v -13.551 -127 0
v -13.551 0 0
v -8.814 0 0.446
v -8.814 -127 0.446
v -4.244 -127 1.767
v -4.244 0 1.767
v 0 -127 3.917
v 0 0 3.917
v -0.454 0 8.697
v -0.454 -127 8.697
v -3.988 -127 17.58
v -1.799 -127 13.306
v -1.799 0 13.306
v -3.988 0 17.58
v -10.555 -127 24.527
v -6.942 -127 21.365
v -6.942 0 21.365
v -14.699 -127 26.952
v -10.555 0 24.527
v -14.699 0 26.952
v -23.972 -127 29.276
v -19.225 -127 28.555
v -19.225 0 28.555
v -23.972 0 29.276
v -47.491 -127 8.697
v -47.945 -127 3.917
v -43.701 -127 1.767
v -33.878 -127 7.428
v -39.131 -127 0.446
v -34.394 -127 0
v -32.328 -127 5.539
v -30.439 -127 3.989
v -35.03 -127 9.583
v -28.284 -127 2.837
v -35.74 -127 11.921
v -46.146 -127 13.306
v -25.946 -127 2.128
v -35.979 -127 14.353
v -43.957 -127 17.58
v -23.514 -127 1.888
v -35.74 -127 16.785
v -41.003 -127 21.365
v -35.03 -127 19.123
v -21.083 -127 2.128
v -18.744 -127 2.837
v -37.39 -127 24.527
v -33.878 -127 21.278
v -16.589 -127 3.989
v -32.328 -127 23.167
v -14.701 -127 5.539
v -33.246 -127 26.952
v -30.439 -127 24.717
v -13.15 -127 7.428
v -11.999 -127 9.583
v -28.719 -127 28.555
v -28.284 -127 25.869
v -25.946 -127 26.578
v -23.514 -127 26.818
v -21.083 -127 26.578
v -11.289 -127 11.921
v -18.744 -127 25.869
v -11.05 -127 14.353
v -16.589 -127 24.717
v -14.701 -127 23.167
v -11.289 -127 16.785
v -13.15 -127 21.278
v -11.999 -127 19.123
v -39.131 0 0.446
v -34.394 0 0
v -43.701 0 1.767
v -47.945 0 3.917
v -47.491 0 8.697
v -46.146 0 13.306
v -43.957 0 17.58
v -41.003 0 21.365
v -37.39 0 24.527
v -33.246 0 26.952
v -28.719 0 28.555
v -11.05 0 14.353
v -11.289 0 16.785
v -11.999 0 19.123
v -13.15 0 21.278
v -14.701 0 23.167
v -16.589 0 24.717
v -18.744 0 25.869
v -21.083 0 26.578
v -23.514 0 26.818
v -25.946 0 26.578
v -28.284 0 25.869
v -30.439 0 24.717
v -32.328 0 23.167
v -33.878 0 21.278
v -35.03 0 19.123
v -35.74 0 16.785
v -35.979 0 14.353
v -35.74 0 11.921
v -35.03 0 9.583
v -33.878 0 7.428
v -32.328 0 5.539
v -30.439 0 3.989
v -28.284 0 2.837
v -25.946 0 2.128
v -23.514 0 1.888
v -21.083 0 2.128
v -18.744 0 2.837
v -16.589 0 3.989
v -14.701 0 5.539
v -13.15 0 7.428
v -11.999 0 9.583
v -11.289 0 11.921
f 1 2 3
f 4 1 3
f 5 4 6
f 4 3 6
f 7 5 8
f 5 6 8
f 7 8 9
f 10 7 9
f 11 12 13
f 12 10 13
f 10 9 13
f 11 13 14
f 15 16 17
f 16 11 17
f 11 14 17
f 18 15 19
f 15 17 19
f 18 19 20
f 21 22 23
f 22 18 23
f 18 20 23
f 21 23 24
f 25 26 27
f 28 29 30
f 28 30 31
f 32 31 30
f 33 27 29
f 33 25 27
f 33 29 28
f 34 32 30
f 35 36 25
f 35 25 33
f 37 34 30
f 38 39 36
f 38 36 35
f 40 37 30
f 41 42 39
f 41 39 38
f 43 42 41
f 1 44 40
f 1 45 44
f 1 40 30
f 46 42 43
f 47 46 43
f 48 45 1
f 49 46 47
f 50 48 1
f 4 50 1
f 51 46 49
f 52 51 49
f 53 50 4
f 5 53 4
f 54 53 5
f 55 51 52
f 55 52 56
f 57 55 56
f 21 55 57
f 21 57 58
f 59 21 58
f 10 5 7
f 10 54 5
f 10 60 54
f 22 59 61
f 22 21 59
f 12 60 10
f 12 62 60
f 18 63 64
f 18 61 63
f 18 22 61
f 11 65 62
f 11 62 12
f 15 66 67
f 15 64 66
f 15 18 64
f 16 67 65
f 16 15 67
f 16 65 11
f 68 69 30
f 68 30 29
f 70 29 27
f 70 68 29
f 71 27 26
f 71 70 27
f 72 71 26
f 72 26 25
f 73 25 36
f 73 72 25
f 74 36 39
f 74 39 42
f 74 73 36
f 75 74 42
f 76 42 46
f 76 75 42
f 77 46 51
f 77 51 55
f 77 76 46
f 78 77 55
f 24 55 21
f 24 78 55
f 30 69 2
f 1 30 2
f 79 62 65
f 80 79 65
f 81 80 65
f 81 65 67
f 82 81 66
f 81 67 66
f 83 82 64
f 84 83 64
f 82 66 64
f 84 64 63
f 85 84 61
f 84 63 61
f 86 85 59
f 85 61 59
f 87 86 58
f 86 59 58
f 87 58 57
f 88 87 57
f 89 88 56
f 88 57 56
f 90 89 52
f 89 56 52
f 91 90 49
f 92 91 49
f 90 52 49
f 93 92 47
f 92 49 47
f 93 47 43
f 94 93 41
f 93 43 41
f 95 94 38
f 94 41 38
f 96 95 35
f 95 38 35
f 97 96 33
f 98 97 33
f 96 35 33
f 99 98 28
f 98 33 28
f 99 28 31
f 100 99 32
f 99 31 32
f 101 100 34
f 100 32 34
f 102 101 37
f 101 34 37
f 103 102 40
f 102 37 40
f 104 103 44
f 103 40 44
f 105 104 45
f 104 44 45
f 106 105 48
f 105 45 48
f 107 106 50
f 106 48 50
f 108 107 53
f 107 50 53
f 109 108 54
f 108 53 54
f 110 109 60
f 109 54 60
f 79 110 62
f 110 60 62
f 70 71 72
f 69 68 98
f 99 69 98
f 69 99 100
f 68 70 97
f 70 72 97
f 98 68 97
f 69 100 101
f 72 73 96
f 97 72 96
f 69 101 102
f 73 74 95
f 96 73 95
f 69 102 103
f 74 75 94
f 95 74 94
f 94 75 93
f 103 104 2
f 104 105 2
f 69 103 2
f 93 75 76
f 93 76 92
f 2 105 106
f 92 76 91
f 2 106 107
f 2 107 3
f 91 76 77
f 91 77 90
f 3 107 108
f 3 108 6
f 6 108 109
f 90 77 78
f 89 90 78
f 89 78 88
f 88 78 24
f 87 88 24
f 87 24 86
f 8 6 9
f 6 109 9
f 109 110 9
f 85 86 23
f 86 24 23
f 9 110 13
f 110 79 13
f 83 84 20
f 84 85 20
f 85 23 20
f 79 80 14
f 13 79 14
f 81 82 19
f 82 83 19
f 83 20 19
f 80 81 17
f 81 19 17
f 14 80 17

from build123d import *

# Parameters (mm, degrees)
F0_W        = 47.9449257255
F0_H        = 29.3166413903
F1_DEPTH    = 127
F3_R        = 12.4646622314
F4_DEPTH    = 127
F5_T1_DEPTH = 254
F6_T1_DEPTH = 194.7542070367
F7_T1_DEPTH = 194.7542070365


# Not quite as in the source:
# - a fillet or chamfer that OpenCascade refuses, or shapes differently, is made with other operations: its cross-section is extruded or revolved along the edge and cut away or added


with BuildPart() as f1:
    # F0 (on Front) → F1 (new body)
    with BuildSketch(Plane.XZ):
        with Locations((-23.9724628627, 14.6583206952)):
            Rectangle(F0_W, F0_H)
    extrude(amount=F1_DEPTH)

    # F3 (on face) → F4 (cut)
    with BuildSketch(Plane.XZ.offset(127)):
        with Locations((-23.5143899918, 14.3529390916)):
            Circle(F3_R)
    extrude(amount=-F4_DEPTH, mode=Mode.SUBTRACT)

    # F5: fillet of radius 25.4 on 2 edges, made by hand

    # F5_s2 → F5_t1 (cut)
    with BuildSketch(Plane.XZ.offset(-63.5)):
        with BuildLine():
            ThreePointArc((-47.9449257255, 3.9166413903), (-40.5054379676, 21.8771536325), (-22.5449257255, 29.3166413903))
            Line((-22.5449257255, 29.3166413903), (-47.9449257255, 29.3166413903))
            Line((-47.9449257255, 29.3166413903), (-47.9449257255, 3.9166413903))
        make_face()
        with BuildLine():
            ThreePointArc((0, 3.9166413903), (-7.4394877579, 21.8771536325), (-25.4, 29.3166413903))
            Line((-25.4, 29.3166413903), (0, 29.3166413903))
            Line((0, 29.3166413903), (0, 3.9166413903))
        make_face()
    extrude(amount=F5_T1_DEPTH, mode=Mode.SUBTRACT)

    # F6: fillet of radius 25.4 on 1 edges, made by hand

    # F6_s2 → F6_t1 (cut)
    with BuildSketch(Plane.XZ.offset(-33.8771035184)):
        with BuildLine():
            ThreePointArc((-13.5508414073, 0), (-6.4980869343, 0.9987980963), (0, 3.9166413903))
            Line((0, 3.9166413903), (0, 0))
            Line((0, 0), (-13.5508414073, 0))
        make_face()
    extrude(amount=F6_T1_DEPTH, mode=Mode.SUBTRACT)

    # F7: fillet of radius 25.4 on 1 edges, made by hand

    # F7_s2 → F7_t1 (cut)
    with BuildSketch(Plane.XZ.offset(-33.8771035183)):
        with BuildLine():
            ThreePointArc((-34.3940843182, 0), (-41.4468387912, 0.9987980963), (-47.9449257255, 3.9166413903))
            Line((-47.9449257255, 3.9166413903), (-47.9449257255, 0))
            Line((-47.9449257255, 0), (-34.3940843182, 0))
        make_face()
    extrude(amount=F7_T1_DEPTH, mode=Mode.SUBTRACT)


solid = f1.part
